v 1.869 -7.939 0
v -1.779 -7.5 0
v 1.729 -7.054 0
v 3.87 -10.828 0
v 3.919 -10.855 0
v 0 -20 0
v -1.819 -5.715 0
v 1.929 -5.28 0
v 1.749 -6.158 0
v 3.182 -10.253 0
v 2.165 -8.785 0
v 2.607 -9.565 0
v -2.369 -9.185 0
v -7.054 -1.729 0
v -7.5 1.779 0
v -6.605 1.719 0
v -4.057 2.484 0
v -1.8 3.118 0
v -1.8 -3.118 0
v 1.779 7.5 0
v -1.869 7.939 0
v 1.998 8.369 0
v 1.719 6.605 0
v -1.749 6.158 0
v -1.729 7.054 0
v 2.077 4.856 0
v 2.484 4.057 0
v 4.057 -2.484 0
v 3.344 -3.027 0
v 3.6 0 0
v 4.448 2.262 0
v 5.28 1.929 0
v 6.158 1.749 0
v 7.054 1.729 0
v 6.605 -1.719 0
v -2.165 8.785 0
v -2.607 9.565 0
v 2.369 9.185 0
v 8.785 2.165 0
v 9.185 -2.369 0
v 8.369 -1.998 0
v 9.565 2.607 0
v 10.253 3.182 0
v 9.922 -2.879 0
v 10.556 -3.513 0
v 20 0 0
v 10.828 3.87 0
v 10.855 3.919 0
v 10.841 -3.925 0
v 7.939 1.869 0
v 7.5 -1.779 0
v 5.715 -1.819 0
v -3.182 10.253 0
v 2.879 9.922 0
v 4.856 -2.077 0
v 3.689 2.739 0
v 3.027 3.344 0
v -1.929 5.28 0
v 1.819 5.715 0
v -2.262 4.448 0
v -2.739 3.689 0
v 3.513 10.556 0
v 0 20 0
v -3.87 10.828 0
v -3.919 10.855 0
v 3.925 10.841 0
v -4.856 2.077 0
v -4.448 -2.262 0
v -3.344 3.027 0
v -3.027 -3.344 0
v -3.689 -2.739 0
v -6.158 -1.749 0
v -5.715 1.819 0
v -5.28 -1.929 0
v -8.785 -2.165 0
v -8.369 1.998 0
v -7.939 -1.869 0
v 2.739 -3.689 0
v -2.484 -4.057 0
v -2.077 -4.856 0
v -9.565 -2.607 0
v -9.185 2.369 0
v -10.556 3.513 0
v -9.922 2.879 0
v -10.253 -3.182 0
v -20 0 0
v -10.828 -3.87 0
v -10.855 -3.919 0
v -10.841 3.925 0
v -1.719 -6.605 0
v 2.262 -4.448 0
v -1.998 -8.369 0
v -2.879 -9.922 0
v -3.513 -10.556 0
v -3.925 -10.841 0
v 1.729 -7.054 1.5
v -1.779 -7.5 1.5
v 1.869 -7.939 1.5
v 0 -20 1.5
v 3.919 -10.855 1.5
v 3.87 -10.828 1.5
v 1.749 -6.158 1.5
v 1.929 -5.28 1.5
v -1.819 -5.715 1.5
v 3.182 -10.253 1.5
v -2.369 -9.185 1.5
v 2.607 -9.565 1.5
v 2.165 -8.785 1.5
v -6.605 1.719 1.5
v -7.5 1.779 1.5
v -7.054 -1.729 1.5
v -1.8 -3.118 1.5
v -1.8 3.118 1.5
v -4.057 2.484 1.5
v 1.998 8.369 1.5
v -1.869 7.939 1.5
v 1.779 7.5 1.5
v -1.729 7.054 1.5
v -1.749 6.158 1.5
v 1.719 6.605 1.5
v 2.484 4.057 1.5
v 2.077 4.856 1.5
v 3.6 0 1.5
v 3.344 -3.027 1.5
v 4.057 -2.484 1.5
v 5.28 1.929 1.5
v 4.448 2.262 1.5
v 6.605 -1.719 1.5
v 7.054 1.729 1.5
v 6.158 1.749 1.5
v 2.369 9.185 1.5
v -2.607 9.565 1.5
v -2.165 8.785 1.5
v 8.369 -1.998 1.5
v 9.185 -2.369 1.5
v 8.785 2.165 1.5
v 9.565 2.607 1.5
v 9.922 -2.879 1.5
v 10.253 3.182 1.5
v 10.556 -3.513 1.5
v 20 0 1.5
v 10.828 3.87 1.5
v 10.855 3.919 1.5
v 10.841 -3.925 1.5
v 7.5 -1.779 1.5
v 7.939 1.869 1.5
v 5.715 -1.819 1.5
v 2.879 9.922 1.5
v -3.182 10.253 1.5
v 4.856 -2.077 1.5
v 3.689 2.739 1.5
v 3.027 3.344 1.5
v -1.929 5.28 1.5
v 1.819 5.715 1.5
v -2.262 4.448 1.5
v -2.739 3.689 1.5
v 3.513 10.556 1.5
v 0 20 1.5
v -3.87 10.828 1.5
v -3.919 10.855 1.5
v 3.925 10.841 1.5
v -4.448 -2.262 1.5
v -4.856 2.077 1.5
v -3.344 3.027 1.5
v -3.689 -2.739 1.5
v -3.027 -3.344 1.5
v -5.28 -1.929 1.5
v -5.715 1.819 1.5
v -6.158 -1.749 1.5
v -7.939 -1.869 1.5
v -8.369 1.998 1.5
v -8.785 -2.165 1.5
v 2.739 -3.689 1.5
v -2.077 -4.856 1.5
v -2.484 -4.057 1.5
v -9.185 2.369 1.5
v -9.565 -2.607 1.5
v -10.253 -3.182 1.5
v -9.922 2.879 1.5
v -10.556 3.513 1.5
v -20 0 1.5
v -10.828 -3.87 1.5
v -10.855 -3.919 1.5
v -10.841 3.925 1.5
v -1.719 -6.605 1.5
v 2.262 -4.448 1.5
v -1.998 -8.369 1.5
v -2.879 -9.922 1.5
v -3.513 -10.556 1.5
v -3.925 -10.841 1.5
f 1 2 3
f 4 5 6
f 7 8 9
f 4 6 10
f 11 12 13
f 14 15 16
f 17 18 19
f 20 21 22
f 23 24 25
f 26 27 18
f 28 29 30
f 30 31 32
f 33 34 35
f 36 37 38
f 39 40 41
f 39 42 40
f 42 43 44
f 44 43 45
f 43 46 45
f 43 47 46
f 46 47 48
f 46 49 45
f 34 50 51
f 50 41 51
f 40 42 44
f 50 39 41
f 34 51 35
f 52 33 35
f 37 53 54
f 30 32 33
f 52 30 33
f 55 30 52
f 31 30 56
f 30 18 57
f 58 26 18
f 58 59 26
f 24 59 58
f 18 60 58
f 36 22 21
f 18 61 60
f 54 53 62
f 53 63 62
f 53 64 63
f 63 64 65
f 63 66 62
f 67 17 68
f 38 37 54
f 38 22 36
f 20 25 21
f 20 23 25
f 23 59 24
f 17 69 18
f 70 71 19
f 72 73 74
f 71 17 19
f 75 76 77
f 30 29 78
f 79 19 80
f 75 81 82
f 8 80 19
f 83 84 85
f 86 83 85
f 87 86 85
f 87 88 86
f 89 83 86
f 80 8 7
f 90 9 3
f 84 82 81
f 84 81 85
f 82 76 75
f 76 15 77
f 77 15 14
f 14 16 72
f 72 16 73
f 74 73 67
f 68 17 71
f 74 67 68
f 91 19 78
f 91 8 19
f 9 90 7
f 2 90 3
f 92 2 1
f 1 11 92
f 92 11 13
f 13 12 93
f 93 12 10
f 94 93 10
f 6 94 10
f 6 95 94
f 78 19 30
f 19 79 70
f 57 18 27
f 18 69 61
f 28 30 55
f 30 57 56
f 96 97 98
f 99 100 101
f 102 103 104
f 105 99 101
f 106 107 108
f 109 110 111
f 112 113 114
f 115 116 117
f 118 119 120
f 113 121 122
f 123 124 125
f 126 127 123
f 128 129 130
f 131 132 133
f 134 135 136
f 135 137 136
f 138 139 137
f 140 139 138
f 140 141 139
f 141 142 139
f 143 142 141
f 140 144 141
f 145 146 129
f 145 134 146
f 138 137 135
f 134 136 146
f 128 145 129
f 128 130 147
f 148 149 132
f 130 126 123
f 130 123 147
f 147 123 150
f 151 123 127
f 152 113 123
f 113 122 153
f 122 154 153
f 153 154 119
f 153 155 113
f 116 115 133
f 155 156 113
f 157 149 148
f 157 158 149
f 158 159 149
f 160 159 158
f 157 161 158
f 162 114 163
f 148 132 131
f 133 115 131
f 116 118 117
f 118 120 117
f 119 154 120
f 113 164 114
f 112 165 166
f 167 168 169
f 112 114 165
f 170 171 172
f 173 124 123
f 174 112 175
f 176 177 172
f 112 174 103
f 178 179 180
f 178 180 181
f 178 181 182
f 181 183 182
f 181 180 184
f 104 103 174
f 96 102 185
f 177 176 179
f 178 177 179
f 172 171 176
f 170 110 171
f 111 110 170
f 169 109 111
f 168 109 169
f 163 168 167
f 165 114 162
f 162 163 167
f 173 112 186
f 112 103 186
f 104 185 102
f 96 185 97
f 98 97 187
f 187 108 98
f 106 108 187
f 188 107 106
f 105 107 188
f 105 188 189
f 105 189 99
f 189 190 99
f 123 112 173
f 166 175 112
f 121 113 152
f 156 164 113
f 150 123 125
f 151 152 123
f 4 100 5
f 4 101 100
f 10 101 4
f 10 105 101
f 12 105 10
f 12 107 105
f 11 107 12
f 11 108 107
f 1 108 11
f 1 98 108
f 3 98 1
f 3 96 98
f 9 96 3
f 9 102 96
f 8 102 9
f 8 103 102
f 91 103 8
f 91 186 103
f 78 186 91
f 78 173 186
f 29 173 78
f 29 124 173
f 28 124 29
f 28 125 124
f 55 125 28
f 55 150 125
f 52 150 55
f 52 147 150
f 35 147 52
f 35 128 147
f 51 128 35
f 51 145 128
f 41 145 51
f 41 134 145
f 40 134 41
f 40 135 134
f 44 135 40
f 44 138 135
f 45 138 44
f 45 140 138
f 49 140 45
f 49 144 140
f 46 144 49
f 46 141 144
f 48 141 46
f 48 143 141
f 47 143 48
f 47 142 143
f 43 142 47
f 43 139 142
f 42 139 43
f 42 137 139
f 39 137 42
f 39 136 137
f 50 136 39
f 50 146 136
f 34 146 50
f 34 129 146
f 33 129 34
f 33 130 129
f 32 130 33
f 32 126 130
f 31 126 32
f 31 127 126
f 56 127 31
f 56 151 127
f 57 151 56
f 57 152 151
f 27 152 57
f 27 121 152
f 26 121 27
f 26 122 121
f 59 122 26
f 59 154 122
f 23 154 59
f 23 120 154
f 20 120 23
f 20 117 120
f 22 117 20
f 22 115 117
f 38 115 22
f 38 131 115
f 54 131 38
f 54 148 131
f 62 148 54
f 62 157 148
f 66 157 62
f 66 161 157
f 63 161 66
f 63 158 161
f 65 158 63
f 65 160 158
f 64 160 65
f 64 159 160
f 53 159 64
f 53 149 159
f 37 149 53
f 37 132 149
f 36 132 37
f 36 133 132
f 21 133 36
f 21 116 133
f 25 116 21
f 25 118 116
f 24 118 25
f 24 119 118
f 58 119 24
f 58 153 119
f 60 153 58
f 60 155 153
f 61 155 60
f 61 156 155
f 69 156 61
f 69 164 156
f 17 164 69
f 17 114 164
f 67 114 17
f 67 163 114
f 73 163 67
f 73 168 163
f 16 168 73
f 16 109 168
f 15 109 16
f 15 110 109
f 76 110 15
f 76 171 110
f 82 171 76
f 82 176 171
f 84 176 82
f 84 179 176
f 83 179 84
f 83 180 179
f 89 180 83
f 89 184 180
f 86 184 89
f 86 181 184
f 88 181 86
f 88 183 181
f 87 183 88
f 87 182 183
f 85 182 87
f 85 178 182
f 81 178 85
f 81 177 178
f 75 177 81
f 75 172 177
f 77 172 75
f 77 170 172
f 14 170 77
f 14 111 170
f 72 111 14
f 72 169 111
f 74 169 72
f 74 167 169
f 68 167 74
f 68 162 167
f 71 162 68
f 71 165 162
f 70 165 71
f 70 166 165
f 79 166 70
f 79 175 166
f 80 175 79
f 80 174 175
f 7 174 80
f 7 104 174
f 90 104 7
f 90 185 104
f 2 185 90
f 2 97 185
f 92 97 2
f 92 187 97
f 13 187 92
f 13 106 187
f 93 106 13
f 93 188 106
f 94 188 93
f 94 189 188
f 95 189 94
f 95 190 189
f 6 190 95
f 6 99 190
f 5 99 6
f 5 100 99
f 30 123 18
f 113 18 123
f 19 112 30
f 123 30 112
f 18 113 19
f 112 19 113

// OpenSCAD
/* [Ninja Star Generator Settings] */
// shape of blades
pointShape = "triangle"; // [triangle,asymTriangle]
// number of blades
numPoints = 4;
// diameter of ninja star
starDiameter = 40;
// how much of the star is the sharp end
bladearmRatio = 0.7; // [0:0.1:1]
// thickness of ninja star
thickness = 1.5;

// sides of in between blade cutout shapes
polygonCutoutSides = 35; // [3,4,5,6,8,50]
// length of cutout shape
cutoutSideLength = 5;

// amount of center that is a hole, set to 0 for no center cutout
centercutoutDiameterRatio = 0.6; // [0:0.1:1]
// centercutout number of sides cutout
centerPolygonSidesCount = 3;

// Calculations //
starRadius = starDiameter/2;
// finding the blade length
bladeLength = starRadius*bladearmRatio;
// finding the complementary center length end
centerRadius = starRadius*(1 - bladearmRatio);
// totals points for calculating star cutouts
numPointsTotal = numPoints*2;
// finding the size of the center cutout
centercutoutRadius = centerRadius*centercutoutDiameterRatio;


module star2() {
	linear_extrude(thickness)
	difference() {
		union() {
			for (i = [0:numPoints]) {
				if (pointShape == "triangle") {
				// actual points
					rotate([0,0,i*360/numPoints]) {
						hull() {
							translate([0,centerRadius]) 
							polygon(points=[[-centerRadius,0]
								,[centerRadius,0]
								,[0,bladeLength]]);
							circle(centerRadius,true,$fn = 30);
						}
					}
				} else if (pointShape == "asymTriangle") {
					rotate([0,0,i*360/numPoints]) {
						hull() {
							translate([0,centerRadius]) 
							polygon(points=[[-centerRadius,0]
								,[0,0]
								,[0,bladeLength]]);
							difference() {
								circle(centerRadius,true,$fn = 30);
								translate([centerRadius,0]) {
									square(centerRadius*2,true);
								}
							}
						}
					}
				}
			}
		}

		union() {
			// in between points cutout
			for (i = [0:numPointsTotal]) {
				if (i % 2 == 1) {
					rotate([0,0,i*360/numPointsTotal]) {
						translate([0,centerRadius + cutoutSideLength*bladearmRatio])
						// rotate([0,0,0])
						circle(r = cutoutSideLength, center = true, $fn = polygonCutoutSides);
					}
				}
			}
			circle(r = centercutoutRadius, center = true, $fn = centerPolygonSidesCount);
		}
	}
}

star2();
